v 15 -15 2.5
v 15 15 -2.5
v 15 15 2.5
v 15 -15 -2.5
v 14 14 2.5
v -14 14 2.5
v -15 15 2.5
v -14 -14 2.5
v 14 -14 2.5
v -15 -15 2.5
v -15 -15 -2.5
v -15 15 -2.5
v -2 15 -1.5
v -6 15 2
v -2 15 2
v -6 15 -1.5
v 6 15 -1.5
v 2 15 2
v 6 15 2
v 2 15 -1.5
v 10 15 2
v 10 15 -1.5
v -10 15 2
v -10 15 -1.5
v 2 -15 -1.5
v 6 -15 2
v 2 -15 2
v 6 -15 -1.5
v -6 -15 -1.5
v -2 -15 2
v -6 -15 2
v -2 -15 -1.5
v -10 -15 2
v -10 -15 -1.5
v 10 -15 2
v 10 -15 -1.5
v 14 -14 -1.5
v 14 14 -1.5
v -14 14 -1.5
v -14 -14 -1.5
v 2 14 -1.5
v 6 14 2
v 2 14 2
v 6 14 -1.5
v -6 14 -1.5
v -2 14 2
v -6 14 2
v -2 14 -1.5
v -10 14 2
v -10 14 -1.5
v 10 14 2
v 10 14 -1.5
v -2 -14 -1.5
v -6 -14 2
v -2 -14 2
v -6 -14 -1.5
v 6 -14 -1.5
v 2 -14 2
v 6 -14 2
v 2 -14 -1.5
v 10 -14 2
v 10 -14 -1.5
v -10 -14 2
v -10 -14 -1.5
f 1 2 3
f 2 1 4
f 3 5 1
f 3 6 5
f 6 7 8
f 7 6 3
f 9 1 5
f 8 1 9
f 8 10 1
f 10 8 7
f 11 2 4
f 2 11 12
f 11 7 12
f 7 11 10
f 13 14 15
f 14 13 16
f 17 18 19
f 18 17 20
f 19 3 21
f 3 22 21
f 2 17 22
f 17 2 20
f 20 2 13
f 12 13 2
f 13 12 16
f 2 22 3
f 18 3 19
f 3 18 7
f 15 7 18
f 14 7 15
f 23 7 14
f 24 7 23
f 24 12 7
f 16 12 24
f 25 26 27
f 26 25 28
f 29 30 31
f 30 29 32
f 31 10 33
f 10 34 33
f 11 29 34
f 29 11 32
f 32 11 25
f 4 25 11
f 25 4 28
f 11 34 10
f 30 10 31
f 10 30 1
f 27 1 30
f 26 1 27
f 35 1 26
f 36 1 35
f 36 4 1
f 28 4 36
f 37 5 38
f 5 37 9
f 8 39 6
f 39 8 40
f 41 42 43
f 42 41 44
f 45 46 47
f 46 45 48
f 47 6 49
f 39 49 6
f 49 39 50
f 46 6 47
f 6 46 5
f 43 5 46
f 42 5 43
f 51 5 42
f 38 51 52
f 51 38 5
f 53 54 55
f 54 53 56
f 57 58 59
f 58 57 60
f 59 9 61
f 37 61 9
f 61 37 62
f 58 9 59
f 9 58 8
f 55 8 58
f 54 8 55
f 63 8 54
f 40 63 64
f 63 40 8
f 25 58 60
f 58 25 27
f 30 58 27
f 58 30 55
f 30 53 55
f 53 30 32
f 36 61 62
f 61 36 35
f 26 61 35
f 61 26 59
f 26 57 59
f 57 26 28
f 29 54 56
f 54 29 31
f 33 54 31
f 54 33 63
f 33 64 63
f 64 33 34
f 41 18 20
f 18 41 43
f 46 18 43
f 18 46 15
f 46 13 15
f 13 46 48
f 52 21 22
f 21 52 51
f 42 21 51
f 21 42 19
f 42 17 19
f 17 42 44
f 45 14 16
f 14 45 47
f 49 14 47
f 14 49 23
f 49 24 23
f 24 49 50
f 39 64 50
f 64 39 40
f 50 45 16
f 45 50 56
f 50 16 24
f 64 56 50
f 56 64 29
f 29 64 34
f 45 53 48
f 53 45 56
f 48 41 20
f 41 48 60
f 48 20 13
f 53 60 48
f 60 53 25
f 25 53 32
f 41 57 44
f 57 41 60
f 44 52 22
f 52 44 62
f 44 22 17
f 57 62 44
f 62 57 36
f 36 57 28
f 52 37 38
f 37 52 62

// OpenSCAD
module box()
{
		difference() {
				cube([30, 30, 5], center = true);
				cube([28, 28, 30], center = true);
				translate([0, -14, 0])
				{
					cube([4, 3, 4], center=true);
				}
				translate([8, -14, 0])
				{
					cube([4, 3, 4], center=true);
				}
				translate([-8, -14, 0])
				{
					cube([4, 3, 4], center=true);
				}
				translate([0, 15, 0])
				{
					cube([4, 3, 4], center=true);
				}
				translate([8, 15, 0])
				{
					cube([4, 3, 4], center=true);
				}
				translate([-8, 15, 0])
				{
					cube([4, 3, 4], center=true);
				}
		}	
		translate([0, 0, -2])
		{
			cube([30, 30, 1], center=true);
		}
	
	
}

box();
